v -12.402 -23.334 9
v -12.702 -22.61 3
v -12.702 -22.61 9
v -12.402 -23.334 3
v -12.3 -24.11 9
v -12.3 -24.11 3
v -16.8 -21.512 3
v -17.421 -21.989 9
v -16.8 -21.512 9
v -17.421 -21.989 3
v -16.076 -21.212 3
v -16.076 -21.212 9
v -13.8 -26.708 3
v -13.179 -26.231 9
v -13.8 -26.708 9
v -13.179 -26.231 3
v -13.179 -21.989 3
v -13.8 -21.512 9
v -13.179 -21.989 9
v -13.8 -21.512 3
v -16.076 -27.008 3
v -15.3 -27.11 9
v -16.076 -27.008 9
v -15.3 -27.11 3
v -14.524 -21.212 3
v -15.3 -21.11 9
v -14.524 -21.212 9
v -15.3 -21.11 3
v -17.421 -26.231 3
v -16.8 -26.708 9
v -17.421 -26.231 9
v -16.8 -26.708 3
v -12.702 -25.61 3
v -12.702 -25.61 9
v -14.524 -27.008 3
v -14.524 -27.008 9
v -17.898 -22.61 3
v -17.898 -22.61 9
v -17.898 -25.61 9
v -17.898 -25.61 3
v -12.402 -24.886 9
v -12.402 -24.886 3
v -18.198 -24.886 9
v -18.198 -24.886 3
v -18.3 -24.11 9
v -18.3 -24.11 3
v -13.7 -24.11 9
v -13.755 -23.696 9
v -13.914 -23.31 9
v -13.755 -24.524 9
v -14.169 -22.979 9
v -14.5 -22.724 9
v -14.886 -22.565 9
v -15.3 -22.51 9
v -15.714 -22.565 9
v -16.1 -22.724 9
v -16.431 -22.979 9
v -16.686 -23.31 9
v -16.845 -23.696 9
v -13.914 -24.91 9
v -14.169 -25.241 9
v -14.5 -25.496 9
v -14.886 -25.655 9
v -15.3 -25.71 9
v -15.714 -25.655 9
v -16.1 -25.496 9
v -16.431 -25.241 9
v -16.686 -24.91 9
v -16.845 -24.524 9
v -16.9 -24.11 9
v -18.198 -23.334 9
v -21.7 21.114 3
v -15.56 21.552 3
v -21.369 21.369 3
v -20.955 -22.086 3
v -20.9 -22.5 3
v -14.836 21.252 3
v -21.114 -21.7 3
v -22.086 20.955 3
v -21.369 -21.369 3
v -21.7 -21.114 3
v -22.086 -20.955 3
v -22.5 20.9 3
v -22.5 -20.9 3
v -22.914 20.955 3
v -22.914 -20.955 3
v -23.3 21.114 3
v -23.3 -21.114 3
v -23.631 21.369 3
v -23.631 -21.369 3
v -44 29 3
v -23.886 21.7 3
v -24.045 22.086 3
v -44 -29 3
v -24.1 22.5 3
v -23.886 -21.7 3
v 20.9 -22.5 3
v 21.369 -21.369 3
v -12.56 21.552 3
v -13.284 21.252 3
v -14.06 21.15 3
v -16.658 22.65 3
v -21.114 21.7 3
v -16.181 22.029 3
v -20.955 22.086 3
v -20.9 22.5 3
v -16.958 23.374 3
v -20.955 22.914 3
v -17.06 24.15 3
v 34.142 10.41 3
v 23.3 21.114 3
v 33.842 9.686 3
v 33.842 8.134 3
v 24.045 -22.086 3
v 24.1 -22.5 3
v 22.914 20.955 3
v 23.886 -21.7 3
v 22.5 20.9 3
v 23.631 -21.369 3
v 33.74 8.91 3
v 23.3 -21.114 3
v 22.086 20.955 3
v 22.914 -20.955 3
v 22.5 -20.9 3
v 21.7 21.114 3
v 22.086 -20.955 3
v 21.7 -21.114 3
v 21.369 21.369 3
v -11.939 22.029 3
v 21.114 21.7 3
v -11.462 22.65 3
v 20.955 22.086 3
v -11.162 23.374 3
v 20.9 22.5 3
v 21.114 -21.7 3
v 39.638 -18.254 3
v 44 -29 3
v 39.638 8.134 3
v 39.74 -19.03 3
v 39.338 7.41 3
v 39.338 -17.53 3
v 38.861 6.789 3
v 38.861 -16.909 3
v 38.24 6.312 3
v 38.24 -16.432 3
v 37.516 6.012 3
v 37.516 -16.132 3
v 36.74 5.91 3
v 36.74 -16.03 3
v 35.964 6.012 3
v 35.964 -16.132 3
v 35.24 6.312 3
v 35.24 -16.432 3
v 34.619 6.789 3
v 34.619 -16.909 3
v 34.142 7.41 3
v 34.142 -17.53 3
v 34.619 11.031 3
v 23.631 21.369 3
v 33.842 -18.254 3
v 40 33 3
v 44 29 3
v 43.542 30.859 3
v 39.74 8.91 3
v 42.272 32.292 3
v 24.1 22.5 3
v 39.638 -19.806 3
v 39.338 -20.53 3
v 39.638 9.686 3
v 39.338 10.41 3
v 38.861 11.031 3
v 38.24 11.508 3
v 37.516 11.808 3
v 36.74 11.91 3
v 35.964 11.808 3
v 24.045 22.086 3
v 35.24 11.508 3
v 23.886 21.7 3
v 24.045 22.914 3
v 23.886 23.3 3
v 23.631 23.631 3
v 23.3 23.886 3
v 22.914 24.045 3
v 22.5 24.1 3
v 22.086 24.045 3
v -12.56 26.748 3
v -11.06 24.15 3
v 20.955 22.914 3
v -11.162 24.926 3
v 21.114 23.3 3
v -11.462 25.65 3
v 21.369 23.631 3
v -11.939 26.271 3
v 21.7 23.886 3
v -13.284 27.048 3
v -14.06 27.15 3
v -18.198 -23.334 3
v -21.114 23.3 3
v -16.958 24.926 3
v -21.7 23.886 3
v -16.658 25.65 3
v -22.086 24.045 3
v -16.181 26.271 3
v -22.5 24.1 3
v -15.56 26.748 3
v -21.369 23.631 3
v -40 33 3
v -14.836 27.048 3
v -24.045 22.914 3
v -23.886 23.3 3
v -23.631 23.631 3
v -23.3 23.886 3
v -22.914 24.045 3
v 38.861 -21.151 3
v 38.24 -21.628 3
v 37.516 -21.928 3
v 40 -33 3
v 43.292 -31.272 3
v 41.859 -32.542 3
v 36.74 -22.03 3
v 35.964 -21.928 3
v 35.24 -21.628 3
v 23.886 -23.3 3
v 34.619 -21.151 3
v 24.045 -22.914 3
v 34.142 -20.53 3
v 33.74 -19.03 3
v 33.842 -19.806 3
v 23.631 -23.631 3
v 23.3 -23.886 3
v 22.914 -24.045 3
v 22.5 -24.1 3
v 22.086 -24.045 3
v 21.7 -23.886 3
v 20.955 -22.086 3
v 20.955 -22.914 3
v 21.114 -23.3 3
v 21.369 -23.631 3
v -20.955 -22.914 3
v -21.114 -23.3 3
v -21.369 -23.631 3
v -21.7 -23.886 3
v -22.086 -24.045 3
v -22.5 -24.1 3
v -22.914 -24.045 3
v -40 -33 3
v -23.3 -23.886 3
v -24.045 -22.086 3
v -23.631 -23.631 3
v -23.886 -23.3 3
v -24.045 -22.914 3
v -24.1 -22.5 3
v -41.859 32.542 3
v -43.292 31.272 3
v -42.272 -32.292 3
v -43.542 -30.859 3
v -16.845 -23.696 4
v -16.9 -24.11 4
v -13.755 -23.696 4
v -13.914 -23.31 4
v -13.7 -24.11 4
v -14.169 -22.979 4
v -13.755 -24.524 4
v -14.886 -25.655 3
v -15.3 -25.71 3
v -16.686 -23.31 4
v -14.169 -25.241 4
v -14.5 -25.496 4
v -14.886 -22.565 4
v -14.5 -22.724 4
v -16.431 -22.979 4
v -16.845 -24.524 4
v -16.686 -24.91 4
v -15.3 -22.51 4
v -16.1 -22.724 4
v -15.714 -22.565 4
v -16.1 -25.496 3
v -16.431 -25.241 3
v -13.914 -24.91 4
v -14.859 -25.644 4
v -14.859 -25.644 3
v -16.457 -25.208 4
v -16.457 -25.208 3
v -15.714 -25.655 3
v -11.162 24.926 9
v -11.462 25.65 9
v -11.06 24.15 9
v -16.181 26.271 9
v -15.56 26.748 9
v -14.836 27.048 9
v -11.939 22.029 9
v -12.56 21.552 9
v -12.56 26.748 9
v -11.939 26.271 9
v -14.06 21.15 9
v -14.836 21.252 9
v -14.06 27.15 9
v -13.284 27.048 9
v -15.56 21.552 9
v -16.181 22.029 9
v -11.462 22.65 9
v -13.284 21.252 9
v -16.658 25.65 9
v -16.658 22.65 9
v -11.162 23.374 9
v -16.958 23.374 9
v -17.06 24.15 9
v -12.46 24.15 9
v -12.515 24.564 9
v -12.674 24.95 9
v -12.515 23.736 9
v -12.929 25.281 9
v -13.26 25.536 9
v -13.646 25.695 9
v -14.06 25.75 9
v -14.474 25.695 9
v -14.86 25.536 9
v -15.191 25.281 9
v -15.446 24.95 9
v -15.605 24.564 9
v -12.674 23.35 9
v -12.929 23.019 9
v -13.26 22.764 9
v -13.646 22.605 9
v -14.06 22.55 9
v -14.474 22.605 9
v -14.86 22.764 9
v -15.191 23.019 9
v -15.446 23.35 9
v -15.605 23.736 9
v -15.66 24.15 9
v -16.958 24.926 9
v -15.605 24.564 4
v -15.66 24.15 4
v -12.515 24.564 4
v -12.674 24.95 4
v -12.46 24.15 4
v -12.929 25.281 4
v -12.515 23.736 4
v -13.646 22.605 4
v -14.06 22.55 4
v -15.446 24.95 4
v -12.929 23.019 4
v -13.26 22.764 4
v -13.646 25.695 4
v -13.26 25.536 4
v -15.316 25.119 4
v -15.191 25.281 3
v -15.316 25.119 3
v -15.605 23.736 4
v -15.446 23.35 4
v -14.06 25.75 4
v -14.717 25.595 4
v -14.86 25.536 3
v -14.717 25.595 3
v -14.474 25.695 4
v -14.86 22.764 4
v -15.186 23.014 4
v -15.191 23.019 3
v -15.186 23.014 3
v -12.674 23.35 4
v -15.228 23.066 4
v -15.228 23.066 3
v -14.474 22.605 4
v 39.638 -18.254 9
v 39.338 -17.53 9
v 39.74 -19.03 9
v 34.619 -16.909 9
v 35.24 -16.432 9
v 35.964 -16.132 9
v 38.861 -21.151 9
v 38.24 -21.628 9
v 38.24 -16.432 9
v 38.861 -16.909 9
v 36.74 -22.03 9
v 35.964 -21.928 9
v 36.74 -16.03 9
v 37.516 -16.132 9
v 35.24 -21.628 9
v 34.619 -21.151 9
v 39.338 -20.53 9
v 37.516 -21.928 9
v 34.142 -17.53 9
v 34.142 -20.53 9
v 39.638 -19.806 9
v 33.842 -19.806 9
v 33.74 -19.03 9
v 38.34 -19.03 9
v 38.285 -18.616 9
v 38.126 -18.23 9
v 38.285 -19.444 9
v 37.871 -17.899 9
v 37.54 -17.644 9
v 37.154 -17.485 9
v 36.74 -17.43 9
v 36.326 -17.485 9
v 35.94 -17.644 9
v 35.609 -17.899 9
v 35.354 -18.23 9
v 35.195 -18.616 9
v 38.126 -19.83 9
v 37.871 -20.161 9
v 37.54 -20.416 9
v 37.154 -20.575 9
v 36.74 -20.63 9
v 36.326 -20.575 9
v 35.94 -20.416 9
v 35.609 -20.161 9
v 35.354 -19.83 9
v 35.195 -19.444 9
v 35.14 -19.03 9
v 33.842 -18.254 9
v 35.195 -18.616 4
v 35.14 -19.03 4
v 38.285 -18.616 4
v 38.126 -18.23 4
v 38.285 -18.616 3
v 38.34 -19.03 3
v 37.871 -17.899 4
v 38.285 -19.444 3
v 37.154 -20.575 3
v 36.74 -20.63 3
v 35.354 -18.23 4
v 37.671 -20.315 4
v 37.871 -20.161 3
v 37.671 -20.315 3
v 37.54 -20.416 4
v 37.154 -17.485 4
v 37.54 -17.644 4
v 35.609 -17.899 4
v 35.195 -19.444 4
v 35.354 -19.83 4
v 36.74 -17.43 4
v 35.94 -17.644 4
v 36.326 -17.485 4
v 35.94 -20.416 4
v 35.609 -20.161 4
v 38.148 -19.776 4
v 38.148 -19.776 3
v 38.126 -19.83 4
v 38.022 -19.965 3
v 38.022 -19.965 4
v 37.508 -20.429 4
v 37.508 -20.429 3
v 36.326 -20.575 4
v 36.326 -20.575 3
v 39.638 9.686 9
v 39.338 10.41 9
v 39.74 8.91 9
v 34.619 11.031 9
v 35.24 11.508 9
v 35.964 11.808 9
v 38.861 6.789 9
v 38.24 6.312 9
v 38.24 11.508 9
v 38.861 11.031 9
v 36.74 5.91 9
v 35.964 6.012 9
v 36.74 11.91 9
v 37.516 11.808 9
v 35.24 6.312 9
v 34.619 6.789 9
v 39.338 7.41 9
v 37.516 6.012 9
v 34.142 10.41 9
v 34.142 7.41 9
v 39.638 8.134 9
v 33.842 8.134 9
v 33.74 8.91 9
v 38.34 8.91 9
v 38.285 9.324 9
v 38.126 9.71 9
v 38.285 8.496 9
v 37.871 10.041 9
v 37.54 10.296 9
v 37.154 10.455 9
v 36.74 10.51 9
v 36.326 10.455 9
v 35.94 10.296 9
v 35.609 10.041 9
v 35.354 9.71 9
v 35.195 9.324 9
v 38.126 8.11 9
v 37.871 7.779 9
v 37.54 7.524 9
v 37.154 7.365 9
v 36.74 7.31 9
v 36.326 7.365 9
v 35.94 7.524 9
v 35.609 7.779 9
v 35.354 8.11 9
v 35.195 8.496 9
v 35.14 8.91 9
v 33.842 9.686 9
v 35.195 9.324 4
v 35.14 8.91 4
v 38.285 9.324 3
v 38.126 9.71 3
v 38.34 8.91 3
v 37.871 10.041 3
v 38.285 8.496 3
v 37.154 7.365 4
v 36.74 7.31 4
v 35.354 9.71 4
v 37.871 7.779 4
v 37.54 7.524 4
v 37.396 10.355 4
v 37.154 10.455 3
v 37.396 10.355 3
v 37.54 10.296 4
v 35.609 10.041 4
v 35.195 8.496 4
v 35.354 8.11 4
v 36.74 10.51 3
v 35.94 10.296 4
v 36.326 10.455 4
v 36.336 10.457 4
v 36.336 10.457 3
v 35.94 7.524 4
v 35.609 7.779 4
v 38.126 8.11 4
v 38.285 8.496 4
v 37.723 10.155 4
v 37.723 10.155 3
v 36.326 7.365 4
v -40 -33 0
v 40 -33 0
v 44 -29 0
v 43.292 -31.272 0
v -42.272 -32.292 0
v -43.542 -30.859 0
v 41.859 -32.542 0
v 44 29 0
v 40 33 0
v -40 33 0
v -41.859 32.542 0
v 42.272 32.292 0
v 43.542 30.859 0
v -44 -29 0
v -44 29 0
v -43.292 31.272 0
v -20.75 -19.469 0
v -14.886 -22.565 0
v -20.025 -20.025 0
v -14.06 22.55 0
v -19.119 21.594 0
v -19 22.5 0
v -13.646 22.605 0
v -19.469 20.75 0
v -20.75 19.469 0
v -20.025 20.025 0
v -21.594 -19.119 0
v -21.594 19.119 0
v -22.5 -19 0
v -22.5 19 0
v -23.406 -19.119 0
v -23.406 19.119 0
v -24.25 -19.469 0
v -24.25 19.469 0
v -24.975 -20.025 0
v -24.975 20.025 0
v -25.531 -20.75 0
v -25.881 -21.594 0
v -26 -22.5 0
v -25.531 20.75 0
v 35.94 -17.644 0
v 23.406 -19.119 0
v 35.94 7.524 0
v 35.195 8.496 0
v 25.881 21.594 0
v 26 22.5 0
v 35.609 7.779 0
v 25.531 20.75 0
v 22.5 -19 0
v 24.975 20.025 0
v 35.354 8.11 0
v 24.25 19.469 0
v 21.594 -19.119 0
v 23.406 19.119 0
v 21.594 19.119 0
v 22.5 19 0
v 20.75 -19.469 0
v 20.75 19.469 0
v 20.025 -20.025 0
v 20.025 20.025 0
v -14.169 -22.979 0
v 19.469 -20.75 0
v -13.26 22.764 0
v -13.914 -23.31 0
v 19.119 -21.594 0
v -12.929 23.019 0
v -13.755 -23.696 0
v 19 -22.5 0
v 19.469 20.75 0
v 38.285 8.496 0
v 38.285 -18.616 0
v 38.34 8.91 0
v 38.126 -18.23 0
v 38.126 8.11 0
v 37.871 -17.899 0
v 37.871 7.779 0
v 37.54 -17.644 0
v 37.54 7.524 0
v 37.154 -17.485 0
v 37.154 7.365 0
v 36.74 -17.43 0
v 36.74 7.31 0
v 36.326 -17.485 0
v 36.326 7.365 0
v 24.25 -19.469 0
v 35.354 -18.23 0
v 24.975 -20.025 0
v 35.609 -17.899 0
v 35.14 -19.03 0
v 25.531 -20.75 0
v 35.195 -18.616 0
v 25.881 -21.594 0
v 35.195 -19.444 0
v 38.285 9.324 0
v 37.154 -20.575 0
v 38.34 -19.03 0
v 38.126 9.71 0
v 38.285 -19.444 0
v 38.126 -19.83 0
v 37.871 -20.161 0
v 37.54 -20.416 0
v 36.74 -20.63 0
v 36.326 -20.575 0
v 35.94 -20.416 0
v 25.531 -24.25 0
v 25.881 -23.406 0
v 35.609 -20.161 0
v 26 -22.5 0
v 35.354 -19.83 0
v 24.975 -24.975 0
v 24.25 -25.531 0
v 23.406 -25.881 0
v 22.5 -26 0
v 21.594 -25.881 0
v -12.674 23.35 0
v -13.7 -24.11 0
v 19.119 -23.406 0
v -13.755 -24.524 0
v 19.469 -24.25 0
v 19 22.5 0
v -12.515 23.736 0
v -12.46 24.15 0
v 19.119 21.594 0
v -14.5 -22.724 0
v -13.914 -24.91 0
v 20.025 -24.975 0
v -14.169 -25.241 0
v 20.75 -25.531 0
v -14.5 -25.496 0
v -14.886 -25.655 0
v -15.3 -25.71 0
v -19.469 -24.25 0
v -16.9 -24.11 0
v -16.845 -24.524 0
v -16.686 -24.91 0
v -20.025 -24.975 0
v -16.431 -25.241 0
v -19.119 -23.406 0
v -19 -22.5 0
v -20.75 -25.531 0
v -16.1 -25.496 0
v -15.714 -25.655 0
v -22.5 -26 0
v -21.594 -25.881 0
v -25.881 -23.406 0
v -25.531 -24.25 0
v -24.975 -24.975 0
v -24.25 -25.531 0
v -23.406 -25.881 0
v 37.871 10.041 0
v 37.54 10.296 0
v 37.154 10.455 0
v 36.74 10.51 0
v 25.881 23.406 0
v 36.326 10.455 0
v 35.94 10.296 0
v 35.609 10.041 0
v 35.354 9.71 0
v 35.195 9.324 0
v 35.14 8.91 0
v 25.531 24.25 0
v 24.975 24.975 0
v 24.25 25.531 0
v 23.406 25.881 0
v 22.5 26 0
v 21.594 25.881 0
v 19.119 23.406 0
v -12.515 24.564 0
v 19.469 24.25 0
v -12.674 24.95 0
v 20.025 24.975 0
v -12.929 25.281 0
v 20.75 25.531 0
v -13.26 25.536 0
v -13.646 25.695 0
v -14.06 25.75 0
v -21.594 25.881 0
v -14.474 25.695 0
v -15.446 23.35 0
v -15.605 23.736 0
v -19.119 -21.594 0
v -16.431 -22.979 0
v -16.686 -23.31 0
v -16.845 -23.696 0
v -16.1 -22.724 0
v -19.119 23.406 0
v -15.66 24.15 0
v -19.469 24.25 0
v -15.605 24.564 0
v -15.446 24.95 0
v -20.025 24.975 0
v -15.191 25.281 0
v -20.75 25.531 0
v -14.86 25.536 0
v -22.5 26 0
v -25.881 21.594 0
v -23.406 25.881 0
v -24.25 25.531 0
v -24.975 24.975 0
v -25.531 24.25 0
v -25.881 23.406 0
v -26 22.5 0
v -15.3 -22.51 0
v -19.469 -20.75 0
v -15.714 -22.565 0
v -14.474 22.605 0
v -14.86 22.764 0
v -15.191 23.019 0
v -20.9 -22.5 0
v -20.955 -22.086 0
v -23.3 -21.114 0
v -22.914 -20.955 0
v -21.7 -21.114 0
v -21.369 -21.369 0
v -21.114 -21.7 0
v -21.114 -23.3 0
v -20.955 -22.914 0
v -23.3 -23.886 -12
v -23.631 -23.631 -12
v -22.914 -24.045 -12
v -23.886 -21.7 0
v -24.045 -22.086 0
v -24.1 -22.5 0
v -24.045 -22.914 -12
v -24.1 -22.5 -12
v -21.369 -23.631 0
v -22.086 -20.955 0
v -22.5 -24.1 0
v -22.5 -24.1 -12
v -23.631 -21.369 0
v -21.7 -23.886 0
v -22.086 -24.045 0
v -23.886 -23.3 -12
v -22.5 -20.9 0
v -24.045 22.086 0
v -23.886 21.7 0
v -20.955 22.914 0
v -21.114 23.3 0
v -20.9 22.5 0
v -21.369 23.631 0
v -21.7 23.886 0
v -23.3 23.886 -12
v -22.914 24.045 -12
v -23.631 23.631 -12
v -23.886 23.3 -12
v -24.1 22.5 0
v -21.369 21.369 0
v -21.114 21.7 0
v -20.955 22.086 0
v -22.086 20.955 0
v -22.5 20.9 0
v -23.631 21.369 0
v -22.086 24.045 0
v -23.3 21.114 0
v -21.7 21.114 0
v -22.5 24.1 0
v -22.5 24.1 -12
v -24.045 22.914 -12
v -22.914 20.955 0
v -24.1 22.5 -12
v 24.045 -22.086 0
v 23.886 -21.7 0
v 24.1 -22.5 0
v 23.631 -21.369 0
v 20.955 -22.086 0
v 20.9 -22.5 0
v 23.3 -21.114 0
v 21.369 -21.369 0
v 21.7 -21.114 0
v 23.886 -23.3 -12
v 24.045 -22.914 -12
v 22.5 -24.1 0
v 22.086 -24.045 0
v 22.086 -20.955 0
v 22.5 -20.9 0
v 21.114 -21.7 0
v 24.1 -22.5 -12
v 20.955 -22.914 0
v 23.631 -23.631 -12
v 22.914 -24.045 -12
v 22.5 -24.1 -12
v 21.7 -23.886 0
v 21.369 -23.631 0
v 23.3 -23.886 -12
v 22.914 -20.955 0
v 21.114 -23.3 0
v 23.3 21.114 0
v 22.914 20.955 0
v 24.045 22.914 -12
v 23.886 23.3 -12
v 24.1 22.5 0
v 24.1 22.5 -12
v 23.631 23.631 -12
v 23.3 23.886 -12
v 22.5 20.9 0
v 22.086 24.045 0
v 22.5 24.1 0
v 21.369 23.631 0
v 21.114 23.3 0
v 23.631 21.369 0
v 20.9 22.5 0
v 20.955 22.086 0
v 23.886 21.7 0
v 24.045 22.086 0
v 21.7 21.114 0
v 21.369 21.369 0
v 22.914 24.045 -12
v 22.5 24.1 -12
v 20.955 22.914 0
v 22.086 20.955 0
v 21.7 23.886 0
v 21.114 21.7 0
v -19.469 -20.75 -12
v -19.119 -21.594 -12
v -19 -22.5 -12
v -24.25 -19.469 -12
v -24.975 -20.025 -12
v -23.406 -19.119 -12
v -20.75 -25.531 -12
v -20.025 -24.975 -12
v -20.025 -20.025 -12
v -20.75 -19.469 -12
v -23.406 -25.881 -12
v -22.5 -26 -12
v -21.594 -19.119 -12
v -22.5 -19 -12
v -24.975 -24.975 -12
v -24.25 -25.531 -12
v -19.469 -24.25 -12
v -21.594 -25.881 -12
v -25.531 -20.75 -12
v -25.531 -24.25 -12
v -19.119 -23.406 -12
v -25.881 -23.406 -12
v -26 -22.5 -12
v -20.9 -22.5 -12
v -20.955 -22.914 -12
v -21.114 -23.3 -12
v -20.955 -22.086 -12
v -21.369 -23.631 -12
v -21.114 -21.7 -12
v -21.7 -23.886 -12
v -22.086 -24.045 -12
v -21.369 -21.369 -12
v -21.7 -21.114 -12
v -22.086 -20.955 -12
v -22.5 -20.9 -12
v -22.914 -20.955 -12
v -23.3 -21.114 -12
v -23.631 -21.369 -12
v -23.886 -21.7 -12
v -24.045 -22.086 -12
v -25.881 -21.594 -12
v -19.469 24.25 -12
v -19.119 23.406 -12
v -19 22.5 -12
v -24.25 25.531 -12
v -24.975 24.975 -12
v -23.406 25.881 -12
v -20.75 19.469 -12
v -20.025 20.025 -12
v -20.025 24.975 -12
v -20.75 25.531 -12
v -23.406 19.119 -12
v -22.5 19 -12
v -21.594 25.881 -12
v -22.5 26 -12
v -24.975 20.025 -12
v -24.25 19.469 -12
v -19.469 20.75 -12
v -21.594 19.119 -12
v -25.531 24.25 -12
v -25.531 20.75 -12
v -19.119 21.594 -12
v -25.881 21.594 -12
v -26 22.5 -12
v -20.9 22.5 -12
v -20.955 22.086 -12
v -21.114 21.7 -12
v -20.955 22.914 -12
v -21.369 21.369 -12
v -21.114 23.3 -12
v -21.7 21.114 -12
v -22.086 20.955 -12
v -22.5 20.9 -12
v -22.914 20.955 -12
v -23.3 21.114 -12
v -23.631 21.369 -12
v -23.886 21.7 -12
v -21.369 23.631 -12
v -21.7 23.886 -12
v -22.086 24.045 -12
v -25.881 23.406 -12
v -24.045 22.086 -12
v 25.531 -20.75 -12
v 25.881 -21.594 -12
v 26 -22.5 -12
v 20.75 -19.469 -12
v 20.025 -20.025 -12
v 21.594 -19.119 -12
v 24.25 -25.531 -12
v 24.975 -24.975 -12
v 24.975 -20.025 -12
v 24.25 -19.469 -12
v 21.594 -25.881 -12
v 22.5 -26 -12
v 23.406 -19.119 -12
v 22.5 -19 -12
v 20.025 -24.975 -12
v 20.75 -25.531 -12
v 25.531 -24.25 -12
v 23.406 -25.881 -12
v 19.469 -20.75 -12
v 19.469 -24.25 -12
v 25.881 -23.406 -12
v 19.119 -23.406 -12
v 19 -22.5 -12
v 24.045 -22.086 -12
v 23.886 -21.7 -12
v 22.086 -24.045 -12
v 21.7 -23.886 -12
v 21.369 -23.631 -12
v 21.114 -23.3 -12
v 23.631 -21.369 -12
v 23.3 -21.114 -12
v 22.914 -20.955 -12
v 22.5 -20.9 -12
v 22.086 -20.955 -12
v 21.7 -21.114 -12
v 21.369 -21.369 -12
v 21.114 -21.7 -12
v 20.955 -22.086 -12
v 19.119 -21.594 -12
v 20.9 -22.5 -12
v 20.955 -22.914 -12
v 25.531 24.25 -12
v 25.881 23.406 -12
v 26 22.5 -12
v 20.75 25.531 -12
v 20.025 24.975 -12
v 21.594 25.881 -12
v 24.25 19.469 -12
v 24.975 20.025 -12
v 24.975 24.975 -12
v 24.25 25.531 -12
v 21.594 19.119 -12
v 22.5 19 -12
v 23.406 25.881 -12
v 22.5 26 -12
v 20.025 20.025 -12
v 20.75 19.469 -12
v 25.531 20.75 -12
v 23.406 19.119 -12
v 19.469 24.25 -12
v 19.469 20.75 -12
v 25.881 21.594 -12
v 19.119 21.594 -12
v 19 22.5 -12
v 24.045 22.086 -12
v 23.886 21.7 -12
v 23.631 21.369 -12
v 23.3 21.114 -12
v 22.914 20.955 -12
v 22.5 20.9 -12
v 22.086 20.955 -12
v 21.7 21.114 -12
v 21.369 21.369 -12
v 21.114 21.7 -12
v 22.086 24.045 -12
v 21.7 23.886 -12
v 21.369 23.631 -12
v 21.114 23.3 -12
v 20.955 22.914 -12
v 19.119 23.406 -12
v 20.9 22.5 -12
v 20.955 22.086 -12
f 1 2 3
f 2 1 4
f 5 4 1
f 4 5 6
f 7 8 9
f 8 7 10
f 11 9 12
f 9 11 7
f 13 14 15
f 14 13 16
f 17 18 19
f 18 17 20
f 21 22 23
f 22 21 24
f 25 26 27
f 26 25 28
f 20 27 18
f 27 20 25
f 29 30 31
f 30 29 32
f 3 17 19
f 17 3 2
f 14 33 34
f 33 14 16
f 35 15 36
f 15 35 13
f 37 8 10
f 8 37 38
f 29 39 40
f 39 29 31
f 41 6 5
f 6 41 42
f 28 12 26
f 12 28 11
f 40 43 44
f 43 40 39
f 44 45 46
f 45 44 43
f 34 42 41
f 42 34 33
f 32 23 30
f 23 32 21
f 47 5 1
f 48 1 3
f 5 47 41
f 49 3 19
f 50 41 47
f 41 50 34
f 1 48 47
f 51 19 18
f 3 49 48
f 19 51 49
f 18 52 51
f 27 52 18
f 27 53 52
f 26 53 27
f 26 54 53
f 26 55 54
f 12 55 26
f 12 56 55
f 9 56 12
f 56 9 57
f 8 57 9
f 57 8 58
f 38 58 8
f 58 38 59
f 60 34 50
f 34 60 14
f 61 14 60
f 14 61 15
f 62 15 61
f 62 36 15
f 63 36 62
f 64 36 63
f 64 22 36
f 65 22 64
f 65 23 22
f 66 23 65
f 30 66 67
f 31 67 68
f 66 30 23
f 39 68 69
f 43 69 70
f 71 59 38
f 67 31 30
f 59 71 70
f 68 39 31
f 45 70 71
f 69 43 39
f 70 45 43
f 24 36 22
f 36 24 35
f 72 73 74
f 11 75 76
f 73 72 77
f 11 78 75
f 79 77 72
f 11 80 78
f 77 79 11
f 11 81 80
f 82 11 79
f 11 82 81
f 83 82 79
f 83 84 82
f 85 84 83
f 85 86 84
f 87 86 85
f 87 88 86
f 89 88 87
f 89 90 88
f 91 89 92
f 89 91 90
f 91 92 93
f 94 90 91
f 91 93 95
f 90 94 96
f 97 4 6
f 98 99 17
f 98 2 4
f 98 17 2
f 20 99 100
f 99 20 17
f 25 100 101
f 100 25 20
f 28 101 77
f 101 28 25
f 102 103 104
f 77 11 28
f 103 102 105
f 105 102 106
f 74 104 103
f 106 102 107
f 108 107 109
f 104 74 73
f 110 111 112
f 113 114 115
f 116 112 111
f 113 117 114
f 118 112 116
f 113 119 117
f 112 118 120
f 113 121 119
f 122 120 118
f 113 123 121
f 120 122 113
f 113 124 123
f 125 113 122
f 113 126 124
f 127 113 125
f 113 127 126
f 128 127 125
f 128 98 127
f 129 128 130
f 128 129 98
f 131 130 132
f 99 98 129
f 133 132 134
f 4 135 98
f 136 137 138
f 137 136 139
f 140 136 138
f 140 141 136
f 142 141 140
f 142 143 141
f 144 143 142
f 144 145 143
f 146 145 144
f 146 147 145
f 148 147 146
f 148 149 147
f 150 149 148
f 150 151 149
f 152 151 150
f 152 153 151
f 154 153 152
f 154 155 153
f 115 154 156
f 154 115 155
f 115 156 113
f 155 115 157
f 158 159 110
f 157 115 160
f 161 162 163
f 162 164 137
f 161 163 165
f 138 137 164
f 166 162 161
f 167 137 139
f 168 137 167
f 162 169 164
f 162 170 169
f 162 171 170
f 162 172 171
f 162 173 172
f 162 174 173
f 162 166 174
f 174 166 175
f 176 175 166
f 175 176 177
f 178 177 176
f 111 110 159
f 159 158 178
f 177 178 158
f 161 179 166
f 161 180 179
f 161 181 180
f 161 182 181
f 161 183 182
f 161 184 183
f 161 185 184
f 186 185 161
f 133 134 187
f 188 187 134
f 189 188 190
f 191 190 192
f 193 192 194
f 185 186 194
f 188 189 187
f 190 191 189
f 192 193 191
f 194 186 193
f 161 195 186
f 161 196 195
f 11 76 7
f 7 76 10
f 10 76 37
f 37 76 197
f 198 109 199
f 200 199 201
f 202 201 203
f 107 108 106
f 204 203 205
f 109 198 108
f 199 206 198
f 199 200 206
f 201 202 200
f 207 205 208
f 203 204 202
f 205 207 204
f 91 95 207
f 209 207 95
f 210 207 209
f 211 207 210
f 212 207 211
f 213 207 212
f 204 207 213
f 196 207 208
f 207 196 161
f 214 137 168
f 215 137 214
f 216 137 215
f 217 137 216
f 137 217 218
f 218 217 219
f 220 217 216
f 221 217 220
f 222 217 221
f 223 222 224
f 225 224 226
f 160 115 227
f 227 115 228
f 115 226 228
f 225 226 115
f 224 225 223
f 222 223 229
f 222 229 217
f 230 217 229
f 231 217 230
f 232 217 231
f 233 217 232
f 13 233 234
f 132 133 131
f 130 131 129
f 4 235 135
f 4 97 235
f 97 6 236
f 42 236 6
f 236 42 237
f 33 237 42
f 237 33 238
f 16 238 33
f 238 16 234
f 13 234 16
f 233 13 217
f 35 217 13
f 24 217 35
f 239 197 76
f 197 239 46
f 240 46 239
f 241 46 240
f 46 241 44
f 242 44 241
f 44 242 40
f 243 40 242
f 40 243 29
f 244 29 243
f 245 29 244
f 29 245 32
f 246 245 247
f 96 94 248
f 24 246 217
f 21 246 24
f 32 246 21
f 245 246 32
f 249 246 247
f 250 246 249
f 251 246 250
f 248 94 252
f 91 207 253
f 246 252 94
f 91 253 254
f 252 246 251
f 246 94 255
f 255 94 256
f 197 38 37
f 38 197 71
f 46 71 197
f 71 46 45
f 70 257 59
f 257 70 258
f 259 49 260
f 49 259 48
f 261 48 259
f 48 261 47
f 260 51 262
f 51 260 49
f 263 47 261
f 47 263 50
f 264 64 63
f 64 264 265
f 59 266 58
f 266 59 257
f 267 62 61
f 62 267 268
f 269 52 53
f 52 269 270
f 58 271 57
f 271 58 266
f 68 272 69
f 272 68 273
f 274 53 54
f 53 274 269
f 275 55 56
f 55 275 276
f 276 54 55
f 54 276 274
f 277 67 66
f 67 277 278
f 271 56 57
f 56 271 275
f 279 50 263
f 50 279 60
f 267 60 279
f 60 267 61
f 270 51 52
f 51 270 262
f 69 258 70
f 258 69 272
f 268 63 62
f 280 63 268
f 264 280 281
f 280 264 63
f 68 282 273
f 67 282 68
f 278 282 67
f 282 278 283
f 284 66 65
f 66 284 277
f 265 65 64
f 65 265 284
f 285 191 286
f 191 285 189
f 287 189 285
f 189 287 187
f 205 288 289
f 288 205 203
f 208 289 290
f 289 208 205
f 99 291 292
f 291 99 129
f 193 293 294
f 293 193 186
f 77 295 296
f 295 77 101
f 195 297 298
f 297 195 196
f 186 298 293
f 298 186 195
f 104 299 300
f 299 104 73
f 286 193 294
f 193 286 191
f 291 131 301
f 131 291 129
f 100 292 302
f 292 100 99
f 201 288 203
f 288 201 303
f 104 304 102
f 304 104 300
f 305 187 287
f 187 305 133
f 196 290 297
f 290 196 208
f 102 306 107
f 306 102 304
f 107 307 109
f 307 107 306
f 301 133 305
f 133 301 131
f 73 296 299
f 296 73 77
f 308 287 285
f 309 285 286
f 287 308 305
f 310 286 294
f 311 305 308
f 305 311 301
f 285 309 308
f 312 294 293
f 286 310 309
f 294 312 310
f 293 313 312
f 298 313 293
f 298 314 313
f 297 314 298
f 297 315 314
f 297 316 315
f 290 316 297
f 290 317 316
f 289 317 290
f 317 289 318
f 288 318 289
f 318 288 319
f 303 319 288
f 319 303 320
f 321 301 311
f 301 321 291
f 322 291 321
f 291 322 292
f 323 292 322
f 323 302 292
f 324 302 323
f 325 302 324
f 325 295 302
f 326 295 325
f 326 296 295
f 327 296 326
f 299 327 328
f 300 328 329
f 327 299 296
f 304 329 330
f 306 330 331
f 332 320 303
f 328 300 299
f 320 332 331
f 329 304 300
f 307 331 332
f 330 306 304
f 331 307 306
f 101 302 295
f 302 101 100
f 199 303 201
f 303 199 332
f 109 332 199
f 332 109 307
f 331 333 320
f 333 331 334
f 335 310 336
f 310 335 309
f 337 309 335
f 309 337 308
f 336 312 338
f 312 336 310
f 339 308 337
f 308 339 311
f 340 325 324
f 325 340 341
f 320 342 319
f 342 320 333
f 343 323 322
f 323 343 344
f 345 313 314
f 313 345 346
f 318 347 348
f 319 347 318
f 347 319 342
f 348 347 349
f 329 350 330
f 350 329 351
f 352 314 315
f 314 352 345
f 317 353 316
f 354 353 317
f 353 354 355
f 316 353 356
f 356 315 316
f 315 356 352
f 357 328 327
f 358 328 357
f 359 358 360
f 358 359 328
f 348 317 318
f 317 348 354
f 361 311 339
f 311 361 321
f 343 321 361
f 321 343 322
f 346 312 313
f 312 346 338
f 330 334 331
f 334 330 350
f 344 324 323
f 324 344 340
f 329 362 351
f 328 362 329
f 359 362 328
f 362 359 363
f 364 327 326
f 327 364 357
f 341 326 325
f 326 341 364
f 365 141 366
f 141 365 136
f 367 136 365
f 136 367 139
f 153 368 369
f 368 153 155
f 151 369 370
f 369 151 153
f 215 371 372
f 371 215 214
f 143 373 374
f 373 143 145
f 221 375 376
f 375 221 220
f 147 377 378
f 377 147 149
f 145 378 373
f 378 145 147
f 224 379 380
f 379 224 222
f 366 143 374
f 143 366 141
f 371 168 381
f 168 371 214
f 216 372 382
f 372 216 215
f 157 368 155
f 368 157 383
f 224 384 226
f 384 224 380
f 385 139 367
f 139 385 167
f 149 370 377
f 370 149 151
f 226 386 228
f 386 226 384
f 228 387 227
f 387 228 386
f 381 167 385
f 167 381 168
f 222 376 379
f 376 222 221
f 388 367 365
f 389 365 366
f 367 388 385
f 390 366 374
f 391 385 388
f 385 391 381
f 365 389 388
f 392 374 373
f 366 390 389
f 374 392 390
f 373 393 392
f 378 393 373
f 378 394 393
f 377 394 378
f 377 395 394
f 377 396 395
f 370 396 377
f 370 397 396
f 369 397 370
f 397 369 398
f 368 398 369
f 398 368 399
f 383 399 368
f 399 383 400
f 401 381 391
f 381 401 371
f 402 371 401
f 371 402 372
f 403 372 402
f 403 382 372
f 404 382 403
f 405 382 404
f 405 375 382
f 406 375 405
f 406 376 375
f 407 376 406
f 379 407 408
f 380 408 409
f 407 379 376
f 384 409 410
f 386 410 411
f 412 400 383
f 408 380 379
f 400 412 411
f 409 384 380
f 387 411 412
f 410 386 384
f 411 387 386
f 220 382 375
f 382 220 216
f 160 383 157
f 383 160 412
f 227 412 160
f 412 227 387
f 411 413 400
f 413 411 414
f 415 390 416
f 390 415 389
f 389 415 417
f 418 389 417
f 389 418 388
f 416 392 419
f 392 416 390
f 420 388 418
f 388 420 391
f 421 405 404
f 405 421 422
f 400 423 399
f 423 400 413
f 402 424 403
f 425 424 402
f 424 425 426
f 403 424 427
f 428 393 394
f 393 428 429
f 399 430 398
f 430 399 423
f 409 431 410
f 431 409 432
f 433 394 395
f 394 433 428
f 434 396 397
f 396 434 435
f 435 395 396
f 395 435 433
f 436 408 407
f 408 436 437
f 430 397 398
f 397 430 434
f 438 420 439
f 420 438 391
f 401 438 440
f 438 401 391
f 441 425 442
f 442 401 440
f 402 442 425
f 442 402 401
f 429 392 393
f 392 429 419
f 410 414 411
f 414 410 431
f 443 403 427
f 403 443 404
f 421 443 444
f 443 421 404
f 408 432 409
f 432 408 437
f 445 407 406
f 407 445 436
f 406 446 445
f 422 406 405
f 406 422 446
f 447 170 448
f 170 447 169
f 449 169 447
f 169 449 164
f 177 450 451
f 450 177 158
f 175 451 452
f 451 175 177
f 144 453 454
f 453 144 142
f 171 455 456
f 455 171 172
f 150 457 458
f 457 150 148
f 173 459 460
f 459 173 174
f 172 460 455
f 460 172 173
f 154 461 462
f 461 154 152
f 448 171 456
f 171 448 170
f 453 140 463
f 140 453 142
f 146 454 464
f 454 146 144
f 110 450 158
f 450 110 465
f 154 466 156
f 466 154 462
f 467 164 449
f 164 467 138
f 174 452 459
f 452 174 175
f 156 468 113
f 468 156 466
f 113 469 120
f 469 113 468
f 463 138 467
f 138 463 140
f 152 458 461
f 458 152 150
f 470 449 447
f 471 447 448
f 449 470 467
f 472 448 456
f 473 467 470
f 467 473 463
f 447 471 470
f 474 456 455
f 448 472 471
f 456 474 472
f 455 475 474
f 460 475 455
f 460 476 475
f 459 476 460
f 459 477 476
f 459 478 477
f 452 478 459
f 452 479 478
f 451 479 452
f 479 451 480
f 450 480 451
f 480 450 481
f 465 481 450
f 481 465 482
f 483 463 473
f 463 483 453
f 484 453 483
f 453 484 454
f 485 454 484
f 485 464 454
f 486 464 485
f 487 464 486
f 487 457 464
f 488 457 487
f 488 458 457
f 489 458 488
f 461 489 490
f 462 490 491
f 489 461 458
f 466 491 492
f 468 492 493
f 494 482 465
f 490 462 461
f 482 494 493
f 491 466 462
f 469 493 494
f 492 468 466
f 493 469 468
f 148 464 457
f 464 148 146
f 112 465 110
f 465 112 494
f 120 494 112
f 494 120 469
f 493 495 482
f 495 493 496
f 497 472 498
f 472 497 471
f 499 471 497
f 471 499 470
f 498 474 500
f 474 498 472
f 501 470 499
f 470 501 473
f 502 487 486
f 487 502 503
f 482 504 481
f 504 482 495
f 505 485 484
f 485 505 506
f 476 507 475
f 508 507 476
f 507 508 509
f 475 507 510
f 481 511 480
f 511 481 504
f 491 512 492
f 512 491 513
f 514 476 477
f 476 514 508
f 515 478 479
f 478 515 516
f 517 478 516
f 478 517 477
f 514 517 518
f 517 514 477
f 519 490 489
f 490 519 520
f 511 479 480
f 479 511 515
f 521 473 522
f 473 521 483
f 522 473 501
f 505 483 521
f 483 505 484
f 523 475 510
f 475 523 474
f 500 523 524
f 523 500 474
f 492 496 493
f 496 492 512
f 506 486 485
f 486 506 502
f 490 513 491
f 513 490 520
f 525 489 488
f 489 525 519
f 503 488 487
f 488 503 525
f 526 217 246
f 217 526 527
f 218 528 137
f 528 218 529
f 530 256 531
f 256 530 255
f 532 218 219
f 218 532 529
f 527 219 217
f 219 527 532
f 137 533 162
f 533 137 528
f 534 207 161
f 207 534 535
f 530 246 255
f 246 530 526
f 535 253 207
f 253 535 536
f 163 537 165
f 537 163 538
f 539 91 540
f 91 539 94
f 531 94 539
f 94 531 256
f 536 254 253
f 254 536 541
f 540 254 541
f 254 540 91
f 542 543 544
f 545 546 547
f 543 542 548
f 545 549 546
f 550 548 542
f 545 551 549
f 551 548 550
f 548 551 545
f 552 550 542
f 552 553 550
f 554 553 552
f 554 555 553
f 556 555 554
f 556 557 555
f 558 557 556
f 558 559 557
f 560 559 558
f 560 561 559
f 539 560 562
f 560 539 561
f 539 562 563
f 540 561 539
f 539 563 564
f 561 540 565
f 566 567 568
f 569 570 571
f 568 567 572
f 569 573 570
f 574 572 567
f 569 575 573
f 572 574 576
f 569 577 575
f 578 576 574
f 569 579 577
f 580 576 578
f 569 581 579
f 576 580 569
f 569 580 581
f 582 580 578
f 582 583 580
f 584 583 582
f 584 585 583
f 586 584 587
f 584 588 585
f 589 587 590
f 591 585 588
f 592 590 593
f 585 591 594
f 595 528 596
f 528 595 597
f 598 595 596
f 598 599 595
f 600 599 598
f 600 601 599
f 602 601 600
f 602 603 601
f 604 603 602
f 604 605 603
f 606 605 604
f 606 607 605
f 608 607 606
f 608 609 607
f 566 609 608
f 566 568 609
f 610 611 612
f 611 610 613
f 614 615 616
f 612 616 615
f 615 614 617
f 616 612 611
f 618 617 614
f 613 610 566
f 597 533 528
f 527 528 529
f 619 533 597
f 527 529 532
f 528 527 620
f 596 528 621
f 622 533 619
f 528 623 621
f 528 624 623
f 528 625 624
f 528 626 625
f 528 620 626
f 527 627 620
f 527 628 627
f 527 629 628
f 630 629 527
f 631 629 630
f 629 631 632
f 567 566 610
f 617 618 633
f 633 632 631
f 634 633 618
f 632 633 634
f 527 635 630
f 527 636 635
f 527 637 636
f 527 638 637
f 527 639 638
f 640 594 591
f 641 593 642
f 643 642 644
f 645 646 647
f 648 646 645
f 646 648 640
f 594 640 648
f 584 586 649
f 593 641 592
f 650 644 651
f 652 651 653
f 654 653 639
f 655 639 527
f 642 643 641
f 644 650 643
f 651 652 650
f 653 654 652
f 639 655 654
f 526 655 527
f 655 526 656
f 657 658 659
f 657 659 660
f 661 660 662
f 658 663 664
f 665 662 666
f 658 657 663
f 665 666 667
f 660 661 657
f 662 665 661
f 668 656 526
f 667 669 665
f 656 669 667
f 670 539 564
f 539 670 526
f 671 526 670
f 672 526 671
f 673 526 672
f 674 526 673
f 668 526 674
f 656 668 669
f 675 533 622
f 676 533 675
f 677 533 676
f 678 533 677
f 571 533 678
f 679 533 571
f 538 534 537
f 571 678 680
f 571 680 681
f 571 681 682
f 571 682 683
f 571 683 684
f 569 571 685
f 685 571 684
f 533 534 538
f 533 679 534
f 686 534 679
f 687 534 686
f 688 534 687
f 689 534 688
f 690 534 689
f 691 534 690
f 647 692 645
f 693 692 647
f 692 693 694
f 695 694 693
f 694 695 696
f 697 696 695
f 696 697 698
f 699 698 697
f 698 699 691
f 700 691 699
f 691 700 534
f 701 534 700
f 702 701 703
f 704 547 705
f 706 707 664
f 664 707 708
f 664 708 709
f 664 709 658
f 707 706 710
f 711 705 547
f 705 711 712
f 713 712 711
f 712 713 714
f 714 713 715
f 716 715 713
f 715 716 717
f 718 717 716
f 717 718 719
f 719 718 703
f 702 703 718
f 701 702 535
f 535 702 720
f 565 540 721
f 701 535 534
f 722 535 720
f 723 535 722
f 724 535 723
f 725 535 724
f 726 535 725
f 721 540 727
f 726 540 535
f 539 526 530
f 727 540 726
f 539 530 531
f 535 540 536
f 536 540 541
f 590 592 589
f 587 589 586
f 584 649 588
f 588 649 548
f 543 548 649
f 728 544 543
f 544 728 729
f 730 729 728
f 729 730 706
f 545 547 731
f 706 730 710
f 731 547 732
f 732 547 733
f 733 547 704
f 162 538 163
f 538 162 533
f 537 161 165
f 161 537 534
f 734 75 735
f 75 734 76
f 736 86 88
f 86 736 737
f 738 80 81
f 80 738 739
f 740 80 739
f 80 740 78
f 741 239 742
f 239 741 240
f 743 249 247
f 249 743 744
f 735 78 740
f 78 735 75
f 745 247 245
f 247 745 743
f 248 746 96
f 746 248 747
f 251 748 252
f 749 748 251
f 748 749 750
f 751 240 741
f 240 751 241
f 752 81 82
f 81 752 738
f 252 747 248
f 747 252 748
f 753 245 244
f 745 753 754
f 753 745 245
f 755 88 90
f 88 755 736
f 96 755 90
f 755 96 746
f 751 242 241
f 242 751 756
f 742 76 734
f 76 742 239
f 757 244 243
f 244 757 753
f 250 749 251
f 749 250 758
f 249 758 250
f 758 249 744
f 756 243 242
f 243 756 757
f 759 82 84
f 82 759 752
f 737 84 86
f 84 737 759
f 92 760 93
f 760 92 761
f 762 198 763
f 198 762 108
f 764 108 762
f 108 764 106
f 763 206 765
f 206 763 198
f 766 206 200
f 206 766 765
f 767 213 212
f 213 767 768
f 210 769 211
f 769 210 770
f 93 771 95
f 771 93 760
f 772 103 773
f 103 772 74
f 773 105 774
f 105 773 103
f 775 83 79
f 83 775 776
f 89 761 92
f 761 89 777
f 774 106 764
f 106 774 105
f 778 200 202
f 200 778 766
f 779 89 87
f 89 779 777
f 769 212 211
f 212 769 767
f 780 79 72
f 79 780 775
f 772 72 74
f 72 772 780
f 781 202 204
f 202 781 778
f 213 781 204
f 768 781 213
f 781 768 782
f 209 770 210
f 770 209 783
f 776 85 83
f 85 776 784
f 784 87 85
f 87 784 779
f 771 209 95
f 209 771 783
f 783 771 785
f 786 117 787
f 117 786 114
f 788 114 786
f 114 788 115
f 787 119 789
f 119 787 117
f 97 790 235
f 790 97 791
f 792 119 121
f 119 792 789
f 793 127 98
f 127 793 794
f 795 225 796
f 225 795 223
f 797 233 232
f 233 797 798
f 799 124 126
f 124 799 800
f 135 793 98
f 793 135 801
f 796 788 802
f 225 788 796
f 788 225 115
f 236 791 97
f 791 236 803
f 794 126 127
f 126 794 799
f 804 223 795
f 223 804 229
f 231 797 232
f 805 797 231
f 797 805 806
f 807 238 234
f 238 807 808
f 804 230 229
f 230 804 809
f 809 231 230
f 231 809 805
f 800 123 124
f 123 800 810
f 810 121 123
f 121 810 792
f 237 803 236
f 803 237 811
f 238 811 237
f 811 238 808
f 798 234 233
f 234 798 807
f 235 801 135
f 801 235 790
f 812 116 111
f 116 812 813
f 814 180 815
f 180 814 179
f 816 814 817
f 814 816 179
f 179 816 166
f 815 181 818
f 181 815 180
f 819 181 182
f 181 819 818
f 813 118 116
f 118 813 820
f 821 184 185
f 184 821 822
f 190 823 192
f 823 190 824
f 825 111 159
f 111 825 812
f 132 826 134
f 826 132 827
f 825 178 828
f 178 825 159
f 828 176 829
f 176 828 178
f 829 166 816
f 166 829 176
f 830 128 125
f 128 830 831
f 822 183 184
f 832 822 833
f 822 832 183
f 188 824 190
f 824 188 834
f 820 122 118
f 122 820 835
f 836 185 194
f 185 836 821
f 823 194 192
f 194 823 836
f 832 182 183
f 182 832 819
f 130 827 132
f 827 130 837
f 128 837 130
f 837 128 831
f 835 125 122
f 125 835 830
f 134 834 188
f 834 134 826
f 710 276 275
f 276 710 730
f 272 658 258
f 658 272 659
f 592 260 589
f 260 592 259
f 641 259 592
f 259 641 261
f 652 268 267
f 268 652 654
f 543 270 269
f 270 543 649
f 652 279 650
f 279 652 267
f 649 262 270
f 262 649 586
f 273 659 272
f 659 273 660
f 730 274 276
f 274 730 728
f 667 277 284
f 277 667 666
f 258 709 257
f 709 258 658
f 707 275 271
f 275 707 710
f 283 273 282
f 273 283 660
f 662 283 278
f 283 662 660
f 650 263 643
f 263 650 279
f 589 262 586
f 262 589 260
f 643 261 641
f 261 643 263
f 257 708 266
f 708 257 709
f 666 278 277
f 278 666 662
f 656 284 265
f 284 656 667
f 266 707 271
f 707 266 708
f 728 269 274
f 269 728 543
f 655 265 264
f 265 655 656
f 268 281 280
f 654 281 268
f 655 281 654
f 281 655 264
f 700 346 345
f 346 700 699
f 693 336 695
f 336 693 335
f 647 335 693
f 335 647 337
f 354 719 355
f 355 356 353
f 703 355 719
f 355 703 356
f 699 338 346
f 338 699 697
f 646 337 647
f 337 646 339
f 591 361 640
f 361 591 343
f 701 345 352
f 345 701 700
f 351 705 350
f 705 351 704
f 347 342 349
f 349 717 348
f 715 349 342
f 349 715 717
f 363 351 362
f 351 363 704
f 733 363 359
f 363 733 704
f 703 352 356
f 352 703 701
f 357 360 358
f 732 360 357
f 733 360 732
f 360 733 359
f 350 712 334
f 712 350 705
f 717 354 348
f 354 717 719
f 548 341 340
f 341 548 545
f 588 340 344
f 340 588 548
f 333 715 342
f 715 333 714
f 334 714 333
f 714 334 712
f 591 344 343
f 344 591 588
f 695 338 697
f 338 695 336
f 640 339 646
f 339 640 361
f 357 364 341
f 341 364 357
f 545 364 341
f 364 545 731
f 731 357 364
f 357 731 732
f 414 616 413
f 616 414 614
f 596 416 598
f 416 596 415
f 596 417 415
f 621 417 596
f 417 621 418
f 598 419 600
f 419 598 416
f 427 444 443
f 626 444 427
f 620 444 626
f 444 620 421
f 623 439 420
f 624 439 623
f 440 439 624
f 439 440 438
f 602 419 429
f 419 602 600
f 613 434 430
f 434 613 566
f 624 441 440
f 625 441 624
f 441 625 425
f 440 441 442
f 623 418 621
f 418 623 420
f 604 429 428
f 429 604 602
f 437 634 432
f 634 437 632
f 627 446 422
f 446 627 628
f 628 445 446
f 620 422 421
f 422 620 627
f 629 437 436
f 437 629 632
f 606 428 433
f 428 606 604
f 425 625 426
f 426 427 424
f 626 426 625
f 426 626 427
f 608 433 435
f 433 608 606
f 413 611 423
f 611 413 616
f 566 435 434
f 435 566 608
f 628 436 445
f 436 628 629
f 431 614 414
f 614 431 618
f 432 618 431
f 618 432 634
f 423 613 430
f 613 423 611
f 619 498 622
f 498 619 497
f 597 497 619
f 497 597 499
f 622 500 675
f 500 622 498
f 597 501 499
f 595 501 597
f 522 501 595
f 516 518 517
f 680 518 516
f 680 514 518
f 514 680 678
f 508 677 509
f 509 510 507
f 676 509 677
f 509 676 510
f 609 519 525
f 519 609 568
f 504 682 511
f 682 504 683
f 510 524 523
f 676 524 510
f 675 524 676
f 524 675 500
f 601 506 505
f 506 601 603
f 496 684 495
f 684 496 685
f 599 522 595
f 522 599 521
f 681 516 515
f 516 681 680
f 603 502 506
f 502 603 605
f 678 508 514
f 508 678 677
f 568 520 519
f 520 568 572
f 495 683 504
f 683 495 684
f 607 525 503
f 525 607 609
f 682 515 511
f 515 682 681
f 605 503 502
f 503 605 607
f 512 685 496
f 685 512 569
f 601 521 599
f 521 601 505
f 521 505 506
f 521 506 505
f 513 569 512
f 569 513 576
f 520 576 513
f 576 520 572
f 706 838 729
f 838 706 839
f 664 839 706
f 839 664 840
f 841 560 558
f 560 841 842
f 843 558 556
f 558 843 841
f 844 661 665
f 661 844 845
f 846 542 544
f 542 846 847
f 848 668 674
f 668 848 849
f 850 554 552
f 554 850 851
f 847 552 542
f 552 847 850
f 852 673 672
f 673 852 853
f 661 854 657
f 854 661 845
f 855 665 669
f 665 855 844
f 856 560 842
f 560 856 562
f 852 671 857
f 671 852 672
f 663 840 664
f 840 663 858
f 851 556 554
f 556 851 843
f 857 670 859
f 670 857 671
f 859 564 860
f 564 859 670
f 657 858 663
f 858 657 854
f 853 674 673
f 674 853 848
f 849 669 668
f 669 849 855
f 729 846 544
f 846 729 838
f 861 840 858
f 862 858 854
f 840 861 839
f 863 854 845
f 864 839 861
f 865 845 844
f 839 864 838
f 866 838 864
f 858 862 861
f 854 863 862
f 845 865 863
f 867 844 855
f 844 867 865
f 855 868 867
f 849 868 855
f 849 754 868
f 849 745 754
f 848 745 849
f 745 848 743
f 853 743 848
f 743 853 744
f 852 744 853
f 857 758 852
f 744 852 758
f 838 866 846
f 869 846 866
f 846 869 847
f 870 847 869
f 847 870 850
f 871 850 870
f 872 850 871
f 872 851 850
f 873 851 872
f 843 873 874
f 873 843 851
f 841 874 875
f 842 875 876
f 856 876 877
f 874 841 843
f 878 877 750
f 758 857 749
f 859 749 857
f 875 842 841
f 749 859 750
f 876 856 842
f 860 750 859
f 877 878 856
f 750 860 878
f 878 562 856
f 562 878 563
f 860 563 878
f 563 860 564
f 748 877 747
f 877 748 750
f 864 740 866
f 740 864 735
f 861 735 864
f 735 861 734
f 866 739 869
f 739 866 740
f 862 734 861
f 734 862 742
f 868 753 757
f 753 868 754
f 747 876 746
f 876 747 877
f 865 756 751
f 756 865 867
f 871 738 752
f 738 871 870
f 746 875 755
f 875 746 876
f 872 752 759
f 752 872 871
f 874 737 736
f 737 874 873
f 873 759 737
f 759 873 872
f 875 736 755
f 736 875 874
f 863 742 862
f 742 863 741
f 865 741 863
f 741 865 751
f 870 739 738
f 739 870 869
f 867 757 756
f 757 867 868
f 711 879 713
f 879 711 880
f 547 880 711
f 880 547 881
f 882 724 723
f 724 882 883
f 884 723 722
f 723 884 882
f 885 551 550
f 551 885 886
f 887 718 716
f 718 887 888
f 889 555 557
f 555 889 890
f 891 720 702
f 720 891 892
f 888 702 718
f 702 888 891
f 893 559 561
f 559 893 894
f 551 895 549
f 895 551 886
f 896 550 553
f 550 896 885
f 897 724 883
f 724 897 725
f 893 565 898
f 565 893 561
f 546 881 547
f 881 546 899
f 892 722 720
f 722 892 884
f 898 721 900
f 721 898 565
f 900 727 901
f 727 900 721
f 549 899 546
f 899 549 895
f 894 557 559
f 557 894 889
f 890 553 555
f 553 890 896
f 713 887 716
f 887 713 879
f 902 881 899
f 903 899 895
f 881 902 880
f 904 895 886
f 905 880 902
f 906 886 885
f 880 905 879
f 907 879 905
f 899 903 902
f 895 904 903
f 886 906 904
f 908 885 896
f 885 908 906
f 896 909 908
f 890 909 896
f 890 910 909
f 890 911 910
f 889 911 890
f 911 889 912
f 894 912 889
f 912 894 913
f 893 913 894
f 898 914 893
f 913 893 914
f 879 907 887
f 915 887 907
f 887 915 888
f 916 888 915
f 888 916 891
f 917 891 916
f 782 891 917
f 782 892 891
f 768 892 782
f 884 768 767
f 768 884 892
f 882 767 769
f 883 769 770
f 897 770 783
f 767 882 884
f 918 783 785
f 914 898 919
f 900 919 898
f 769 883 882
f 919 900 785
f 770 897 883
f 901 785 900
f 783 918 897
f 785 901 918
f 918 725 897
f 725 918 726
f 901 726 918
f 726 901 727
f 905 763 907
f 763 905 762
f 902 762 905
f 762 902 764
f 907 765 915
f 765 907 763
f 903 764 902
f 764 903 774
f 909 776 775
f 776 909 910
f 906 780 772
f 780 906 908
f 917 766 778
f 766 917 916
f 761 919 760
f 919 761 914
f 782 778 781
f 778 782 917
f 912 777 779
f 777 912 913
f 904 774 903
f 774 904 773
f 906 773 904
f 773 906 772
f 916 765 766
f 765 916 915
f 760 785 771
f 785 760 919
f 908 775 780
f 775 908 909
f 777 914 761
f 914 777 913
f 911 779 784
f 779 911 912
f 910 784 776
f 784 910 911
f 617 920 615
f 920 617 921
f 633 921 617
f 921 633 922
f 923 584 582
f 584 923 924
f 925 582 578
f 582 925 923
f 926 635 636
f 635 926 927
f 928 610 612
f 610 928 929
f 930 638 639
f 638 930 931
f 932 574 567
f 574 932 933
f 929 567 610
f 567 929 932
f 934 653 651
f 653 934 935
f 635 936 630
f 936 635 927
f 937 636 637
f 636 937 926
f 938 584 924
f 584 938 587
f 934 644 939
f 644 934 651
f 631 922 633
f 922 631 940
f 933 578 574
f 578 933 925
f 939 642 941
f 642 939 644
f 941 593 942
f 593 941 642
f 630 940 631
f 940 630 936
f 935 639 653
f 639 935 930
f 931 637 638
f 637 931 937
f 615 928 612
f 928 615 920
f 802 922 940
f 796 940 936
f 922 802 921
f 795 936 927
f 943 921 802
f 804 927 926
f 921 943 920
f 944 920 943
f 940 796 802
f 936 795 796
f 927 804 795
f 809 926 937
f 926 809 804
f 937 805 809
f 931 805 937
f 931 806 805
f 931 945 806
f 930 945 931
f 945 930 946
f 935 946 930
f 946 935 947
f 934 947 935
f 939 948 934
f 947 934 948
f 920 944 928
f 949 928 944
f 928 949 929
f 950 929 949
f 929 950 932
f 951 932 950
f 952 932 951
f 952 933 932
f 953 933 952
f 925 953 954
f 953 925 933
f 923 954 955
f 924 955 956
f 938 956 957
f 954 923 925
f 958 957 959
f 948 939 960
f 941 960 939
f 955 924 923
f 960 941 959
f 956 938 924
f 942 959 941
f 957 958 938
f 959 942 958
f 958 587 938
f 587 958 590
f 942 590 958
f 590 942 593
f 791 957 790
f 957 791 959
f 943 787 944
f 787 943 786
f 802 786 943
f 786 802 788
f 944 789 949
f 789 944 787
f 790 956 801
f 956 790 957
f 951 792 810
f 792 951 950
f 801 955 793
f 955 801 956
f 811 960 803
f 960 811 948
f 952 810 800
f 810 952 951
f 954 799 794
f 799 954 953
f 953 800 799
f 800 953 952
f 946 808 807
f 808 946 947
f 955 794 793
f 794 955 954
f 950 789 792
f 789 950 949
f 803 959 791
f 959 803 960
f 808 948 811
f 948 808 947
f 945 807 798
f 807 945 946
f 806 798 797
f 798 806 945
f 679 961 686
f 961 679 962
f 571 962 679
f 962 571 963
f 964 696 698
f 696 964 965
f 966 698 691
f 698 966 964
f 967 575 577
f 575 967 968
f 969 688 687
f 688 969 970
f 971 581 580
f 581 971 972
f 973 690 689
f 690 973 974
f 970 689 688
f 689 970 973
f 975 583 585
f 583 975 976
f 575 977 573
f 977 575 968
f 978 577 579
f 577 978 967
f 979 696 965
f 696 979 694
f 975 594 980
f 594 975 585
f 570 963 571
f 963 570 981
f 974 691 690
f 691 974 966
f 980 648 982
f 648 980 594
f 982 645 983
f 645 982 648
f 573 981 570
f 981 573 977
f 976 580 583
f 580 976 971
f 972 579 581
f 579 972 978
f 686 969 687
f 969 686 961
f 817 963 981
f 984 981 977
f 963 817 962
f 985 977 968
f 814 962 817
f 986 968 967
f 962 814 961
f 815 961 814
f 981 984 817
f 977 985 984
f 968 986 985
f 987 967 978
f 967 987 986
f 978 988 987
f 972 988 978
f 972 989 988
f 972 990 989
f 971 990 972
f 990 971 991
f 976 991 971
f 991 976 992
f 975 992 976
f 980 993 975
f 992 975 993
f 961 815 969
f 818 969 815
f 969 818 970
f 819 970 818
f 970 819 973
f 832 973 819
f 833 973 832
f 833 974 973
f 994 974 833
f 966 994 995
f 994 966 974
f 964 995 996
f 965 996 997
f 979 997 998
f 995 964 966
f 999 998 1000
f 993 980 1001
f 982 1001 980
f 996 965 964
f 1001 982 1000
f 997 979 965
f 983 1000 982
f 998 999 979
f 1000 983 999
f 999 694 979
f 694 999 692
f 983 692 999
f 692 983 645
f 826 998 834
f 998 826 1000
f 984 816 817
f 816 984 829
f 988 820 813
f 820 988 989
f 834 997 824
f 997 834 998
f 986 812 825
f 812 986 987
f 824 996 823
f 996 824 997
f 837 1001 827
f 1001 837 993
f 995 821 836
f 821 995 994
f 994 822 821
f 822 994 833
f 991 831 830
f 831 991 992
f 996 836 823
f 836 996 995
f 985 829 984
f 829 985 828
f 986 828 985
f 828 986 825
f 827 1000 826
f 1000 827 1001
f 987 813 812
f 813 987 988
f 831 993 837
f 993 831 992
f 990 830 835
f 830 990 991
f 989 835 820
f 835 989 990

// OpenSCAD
// ============================================================
// F450 Top Mount — Arduino UNO Q
// Mounts above F450 top plate on standoffs
// ============================================================
// ** VERIFY ALL BOARD DIMENSIONS BEFORE PRINTING **

// ---- Parameters ----

// Base plate
plate_thickness = 3.0;
plate_w = 88;           // X dimension
plate_h = 66;           // Y dimension (53.3 + margin)
corner_r = 4;

// F450 center mounting holes (M3)
f450_hole_spacing_x = 45;
f450_hole_spacing_y = 45;
f450_hole_d = 3.2;

// Standoff parameters (plate sits above F450 top plate)
standoff_h = 12;
standoff_od = 7;
standoff_id = 3.2;

// ---- Board dimensions (MEASURE AND ADJUST) ----

uno_w = 68.6;
uno_h = 53.3;
uno_holes = [
    [14.0, 2.54],
    [15.24, 50.8],
    [66.04, 7.62],
    [66.04, 35.56]
];
uno_hole_d = 3.2;
uno_standoff_h = 6;
uno_standoff_od = 6;

// Board offset +5mm in X to clear F450 standoffs + screw heads
uno_pos = [-uno_w/2 + 5, -uno_h/2];

// ============================================================
// Modules
// ============================================================

module rounded_rect(w, h, r, t) {
    linear_extrude(t)
    offset(r) offset(-r)
        square([w, h], center=true);
}

module board_standoff(h, od, id) {
    difference() {
        cylinder(h=h, d=od, $fn=24);
        translate([0, 0, -0.1])
            cylinder(h=h+0.2, d=id, $fn=24);
    }
}

module board_mount(pos, board_w, board_h, holes, hole_d, so_h, so_od) {
    for (h = holes) {
        translate([pos[0] + h[0], pos[1] + h[1], plate_thickness])
            board_standoff(so_h, so_od, hole_d);
    }
    %translate([pos[0], pos[1], plate_thickness + so_h])
        color("green", 0.3)
        cube([board_w, board_h, 1.6]);
}

module board_through_holes(pos, holes, hole_d) {
    for (h = holes) {
        translate([pos[0] + h[0], pos[1] + h[1], -1])
            cylinder(h=plate_thickness + 2, d=hole_d, $fn=24);
    }
}

module f450_mounting_holes() {
    for (x = [-1, 1], y = [-1, 1]) {
        translate([x * f450_hole_spacing_x/2,
                   y * f450_hole_spacing_y/2, -1])
            cylinder(h=plate_thickness + 2, d=f450_hole_d, $fn=24);
    }
}

module f450_standoffs() {
    for (x = [-1, 1], y = [-1, 1]) {
        translate([x * f450_hole_spacing_x/2,
                   y * f450_hole_spacing_y/2, -standoff_h])
            board_standoff(standoff_h, standoff_od, standoff_id);
    }
}


// ============================================================
// Assembly
// ============================================================

module plate_assembly() {
    difference() {
        union() {
            rounded_rect(plate_w, plate_h, corner_r, plate_thickness);
            board_mount(uno_pos, uno_w, uno_h,
                        uno_holes, uno_hole_d,
                        uno_standoff_h, uno_standoff_od);
        }
        f450_mounting_holes();
        board_through_holes(uno_pos, uno_holes, uno_hole_d);
    }
    f450_standoffs();
}

plate_assembly();

// ---- Visualization: F450 center plate outline ----
%translate([0, 0, -(standoff_h + 2)])
    color("gray", 0.2)
    rounded_rect(155, 155, 5, 2);
